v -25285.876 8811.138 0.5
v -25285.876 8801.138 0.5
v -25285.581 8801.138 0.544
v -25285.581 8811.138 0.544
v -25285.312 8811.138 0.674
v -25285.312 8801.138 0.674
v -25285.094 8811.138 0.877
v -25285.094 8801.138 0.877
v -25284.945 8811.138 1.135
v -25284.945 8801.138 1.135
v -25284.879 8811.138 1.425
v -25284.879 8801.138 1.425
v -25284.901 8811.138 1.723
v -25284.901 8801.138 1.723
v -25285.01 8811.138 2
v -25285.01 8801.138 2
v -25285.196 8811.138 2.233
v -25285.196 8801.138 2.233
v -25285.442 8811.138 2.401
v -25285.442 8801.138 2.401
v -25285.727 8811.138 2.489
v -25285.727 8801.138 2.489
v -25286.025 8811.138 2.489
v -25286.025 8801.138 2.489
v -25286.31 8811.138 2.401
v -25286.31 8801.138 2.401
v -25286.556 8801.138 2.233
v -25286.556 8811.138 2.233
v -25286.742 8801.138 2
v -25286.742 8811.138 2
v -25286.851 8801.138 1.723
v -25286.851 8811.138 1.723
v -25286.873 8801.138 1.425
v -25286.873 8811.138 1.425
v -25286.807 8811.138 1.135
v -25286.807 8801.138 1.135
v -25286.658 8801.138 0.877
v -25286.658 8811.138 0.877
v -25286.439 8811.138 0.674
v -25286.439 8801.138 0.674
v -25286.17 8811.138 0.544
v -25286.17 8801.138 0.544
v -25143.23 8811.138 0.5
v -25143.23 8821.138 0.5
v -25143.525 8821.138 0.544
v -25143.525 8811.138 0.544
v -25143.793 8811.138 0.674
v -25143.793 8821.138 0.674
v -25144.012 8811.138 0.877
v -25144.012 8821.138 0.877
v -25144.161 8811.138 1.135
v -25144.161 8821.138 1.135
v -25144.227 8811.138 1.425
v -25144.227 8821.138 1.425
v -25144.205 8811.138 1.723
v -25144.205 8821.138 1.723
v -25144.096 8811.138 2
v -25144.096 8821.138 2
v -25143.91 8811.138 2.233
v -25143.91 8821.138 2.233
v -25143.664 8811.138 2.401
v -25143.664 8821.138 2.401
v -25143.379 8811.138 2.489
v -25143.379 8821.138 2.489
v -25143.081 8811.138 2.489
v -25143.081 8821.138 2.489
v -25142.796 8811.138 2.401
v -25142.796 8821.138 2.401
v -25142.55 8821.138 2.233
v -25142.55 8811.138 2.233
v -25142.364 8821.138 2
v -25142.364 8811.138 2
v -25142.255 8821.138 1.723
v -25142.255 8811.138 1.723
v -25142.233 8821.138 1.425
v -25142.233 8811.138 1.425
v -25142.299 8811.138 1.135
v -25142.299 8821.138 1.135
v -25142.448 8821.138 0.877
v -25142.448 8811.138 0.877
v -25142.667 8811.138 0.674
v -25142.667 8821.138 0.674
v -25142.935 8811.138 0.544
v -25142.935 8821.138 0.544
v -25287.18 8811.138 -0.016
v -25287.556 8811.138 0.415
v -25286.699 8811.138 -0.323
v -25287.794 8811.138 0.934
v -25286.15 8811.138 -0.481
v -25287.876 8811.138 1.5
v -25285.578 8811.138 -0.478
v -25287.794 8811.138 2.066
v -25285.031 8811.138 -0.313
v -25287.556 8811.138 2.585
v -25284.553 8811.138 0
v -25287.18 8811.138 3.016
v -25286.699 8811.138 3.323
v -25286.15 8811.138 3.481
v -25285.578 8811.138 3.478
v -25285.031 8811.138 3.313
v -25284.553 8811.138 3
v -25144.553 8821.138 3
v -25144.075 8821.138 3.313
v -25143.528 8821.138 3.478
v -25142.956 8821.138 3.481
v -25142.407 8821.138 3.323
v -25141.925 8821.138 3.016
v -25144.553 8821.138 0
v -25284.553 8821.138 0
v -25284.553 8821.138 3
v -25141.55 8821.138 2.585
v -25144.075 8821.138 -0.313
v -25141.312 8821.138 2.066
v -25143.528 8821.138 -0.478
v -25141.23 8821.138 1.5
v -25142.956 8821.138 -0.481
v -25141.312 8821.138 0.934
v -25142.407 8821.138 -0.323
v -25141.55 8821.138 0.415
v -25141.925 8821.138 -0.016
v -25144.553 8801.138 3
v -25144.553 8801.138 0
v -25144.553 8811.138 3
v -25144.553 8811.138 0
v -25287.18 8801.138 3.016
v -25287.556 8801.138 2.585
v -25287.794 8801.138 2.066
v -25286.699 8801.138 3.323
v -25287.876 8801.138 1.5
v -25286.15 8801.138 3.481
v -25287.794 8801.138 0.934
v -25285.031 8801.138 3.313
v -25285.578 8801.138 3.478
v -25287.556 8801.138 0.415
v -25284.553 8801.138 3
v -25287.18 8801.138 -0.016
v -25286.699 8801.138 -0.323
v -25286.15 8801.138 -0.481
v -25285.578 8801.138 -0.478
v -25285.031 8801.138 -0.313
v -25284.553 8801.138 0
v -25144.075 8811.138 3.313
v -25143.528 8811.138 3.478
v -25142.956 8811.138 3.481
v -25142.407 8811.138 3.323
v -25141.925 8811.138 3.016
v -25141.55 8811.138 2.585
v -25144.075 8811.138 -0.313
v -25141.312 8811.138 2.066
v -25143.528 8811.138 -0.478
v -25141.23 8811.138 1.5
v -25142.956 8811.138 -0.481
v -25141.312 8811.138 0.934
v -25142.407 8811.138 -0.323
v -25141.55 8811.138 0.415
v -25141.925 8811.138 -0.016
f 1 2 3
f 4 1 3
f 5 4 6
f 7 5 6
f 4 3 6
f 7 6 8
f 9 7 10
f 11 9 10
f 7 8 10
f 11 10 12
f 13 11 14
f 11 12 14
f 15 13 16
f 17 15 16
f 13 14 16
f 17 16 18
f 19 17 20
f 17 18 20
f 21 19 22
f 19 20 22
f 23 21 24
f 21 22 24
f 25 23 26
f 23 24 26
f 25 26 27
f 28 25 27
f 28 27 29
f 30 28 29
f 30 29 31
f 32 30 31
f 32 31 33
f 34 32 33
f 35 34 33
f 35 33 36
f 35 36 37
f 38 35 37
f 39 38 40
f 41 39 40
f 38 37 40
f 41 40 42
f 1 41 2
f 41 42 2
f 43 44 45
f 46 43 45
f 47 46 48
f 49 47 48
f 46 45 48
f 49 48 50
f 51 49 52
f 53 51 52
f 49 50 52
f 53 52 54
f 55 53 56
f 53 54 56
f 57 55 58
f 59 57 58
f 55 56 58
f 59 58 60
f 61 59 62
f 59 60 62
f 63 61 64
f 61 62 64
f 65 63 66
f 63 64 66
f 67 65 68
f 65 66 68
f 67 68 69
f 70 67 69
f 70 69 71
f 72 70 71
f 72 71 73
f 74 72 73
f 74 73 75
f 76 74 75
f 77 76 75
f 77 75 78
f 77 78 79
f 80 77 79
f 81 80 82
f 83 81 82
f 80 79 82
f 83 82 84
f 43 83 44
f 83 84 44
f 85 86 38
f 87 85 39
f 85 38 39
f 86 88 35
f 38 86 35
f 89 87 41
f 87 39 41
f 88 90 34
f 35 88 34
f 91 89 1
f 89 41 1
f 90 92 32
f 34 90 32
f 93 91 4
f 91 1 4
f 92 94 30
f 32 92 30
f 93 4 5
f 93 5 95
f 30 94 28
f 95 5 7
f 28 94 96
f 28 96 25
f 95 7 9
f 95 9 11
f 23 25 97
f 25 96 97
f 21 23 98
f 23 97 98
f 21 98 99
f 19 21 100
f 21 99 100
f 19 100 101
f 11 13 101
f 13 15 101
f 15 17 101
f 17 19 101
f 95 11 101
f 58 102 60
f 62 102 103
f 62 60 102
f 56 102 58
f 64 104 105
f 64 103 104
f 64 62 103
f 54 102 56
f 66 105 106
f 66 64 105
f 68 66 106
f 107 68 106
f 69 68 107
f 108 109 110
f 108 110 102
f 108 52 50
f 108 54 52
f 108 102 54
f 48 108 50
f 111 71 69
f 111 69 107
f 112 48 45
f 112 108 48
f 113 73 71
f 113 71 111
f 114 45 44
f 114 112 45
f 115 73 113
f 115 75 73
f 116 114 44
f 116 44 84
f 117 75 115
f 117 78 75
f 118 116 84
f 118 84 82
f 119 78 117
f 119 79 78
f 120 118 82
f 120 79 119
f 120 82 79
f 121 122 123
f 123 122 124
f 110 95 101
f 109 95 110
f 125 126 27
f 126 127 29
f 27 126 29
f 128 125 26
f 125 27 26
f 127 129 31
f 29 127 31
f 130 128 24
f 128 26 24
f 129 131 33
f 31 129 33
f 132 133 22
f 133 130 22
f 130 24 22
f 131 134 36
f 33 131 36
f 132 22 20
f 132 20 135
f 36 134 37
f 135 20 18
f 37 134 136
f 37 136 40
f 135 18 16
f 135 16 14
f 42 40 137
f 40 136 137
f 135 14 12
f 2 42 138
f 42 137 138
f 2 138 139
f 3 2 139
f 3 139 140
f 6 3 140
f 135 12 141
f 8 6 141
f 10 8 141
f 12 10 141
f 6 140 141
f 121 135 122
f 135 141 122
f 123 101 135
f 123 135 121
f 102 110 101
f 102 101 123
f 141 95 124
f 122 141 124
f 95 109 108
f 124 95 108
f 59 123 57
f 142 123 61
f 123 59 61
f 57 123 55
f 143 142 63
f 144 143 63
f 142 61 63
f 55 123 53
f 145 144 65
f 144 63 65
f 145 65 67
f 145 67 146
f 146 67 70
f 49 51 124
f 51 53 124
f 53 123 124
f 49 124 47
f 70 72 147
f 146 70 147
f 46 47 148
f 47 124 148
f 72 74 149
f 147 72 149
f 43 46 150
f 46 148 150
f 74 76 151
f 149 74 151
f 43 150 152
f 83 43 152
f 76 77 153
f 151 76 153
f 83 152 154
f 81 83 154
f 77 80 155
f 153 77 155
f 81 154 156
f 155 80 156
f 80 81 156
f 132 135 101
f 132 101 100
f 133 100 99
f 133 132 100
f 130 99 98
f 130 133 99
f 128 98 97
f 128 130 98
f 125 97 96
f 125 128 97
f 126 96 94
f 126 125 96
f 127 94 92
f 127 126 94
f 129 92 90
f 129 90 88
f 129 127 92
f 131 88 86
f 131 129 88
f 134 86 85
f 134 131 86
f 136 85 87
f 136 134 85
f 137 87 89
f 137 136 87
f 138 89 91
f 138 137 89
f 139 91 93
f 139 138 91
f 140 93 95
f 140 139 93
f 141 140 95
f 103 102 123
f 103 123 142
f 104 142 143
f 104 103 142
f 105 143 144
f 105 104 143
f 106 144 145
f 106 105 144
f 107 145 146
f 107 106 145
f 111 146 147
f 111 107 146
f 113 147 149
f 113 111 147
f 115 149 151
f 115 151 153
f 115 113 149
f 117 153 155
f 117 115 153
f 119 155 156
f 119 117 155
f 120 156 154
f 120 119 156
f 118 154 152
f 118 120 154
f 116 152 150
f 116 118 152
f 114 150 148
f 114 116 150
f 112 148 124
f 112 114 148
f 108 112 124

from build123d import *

# Parameters (mm, degrees)
SKETCH1_W           = 140
SKETCH1_H           = 20
BOSS_EXTRUDE1_DEPTH = 3
SKETCH2_R           = 2
SKETCH2_R_2         = 1
BOSS_EXTRUDE2_DEPTH = 10
SKETCH3_R           = 2
SKETCH3_R_2         = 1
BOSS_EXTRUDE3_DEPTH = 10


with BuildPart() as part:
    # Sketch1 → Boss-Extrude1 (new body)
    with BuildSketch(Plane.XY):
        with Locations((-25214.552845528, 8811.138211382)):
            Rectangle(SKETCH1_W, SKETCH1_H)
    extrude(amount=BOSS_EXTRUDE1_DEPTH)

    # Sketch2 → Boss-Extrude2 (add)
    with BuildSketch(Plane(origin=(0, 8821.138211382, 0), x_dir=(1, 0, 0), z_dir=(0, 1, 0))):
        with Locations((-25143.229969873, -1.5)):
            Circle(SKETCH2_R)
        with Locations(Location((-25143.229969873, -1.5, 0), (0, 0, 89.999999998))):
            Circle(SKETCH2_R_2, mode=Mode.SUBTRACT)
    extrude(amount=-BOSS_EXTRUDE2_DEPTH)

    # Sketch3 → Boss-Extrude3 (add)
    with BuildSketch(Plane.XZ.offset(-8801.138211382)):
        with Locations((-25285.875721184, 1.5)):
            Circle(SKETCH3_R)
        with Locations(Location((-25285.875721184, 1.5, 0), (0, 0, 270))):
            Circle(SKETCH3_R_2, mode=Mode.SUBTRACT)
    extrude(amount=-BOSS_EXTRUDE3_DEPTH)


solid = part.part
